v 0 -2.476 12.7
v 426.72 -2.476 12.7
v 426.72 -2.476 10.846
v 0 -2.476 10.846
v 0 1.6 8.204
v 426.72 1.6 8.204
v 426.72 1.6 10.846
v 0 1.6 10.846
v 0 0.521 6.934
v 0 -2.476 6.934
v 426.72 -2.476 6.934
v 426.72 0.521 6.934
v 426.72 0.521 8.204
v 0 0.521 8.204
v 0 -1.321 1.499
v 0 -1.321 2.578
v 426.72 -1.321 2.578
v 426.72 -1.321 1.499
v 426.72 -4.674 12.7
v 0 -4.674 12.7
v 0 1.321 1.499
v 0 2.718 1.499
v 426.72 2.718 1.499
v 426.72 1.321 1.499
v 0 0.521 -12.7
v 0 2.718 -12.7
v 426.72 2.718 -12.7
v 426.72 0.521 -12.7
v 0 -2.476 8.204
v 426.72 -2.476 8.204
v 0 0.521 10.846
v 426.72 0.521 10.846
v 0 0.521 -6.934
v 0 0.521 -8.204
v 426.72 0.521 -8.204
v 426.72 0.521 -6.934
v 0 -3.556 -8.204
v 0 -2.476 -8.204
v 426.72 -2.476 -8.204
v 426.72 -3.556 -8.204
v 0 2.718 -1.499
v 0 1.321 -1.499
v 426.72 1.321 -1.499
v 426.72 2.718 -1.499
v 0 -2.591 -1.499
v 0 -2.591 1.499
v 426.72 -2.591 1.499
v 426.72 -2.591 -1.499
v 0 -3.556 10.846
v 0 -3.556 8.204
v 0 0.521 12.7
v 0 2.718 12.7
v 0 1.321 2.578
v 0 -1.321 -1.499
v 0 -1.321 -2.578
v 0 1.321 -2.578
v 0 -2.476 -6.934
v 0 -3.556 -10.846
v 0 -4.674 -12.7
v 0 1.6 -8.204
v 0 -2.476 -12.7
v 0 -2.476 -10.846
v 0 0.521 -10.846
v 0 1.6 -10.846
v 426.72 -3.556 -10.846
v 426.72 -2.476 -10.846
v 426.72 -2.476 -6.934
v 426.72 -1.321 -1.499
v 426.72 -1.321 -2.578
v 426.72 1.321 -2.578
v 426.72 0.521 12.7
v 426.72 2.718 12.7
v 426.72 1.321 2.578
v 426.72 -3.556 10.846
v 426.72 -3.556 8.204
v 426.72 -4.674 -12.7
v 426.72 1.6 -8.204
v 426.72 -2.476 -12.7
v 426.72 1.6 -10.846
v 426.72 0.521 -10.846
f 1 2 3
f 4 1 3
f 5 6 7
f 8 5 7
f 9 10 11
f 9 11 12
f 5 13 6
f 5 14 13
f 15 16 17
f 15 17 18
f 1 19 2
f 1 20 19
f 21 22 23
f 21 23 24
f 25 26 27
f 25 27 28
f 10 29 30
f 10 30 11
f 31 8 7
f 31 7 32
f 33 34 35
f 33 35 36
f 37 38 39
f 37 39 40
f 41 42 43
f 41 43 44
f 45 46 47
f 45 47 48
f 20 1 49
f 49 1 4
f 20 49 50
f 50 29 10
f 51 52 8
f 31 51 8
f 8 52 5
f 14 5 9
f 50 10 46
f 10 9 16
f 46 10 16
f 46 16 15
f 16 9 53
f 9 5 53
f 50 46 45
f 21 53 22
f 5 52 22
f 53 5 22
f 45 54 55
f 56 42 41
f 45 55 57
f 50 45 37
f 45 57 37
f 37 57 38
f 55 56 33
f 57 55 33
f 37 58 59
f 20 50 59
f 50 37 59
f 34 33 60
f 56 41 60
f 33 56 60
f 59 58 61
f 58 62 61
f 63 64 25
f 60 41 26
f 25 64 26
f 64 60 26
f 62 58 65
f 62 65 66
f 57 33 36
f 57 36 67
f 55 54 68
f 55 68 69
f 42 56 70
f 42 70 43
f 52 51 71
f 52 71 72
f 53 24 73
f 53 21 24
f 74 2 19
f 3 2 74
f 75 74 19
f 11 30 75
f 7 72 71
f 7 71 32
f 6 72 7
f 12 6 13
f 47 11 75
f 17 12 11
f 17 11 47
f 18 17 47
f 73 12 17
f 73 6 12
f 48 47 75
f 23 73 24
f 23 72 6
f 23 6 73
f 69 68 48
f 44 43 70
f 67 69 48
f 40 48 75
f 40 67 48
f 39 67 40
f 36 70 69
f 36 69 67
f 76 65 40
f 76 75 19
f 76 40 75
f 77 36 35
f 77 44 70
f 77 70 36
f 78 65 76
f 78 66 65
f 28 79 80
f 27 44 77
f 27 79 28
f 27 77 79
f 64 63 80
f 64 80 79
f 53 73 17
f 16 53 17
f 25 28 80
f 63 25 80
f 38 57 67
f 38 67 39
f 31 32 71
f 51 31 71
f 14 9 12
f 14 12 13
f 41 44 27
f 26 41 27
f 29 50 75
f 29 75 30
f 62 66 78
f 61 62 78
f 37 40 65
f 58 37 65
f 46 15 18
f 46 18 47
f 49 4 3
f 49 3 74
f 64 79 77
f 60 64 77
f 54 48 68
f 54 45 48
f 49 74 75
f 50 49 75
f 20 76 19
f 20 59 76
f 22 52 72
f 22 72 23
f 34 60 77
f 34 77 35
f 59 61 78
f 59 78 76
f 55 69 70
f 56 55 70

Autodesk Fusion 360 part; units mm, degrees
sketch "Sketch1" plane through (0, 0, 0) normal (1, 0, 0) x (0, 0, -1)
  line L0 (-12.7, -4.6736) -> (-12.7, -2.4765)
  line L1 (-12.7, -2.4765) -> (-10.8458, -2.4765)
  line L2 (-10.8458, -2.4765) -> (-10.8458, -3.556)
  line L3 (-10.8458, -3.556) -> (-8.2042, -3.556)
  line L4 (-8.2042, -3.556) -> (-8.2042, -2.4765)
  line L5 (-8.2042, -2.4765) -> (-6.9342, -2.4765)
  line L6 (-6.9342, -2.4765) -> (-6.9342, 0.5207)
  line L7 (-6.9342, 0.5207) -> (-8.2042, 0.5207)
  line L8 (-8.2042, 0.5207) -> (-8.2042, 1.6002)
  line L9 (-8.2042, 1.6002) -> (-10.8458, 1.6002)
  line L10 (-10.8458, 1.6002) -> (-10.8458, 0.5207)
  line L11 (-10.8458, 0.5207) -> (-12.7, 0.5207)
  line L12 (-12.7, 0.5207) -> (-12.7, 2.7178)
  line L13 (-12.7, 2.7178) -> (-1.4986, 2.7178)
  line L14 (-1.4986, 2.7178) -> (-1.4986, 1.3208)
  line L15 (-1.4986, 1.3208) -> (-2.5781, 1.3208)
  line L16 (-2.5781, 1.3208) -> (-2.5781, -1.3208)
  line L17 (-2.5781, -1.3208) -> (-1.4986, -1.3208)
  line L18 (-1.4986, -1.3208) -> (-1.4986, -2.5908)
  line L19 (-1.4986, -2.5908) -> (0, -2.5908)
  line L20 (0, -4.6736) -> (-12.7, -4.6736)
  line L21 (-9.525, -3.556) -> (-9.525, 1.6002) construction
  line L22 (0, -2.5908) -> (0, -4.6736)
  line L23 (-6.9342, -0.9779) -> (-13.037, -0.9779) construction
  line L24 (-2.5781, 0) -> (0, 0) construction
  dimension "d13" = 12.7
  dimension "d14" = 9.525
  dimension "d15" = 5.1562
  dimension "d16" = 7.3914
  dimension "d17" = 1.27
  dimension "d18" = 2.6416
  dimension "d19" = 1.8542
  dimension "d20" = 2.9972
  dimension "d21" = 1.1176
  dimension "d22" = 1.397
  dimension "d23" = 2.5781
  dimension "d24" = 2.6416
  dimension "d25" = 1.27
  dimension "d26" = 1.4986
extrude "Extrude1" add sketch "Sketch1" along normal blind 426.72 makes body 1
mirror "Mirror1" about plane through (0, 0, 0) normal (0, 0, 1) of bodies 1 makes body 2
combine "Combine1" operation add target body 1 tool bodies 2
equation "d13 = ( 1 / 2 ) * 1 in"
equation "d14 = ( 0.75 / 2 ) * 1 in"
equation "d23 = ( 0.203 / 2 ) * 1 in"
equation "d26 = ( 0.118 / 2 ) * 1 in"
equation "hp_length = 84"
equation "hp_constant = 5.08 mm"
equation "d29 = hp_constant * hp_length"
